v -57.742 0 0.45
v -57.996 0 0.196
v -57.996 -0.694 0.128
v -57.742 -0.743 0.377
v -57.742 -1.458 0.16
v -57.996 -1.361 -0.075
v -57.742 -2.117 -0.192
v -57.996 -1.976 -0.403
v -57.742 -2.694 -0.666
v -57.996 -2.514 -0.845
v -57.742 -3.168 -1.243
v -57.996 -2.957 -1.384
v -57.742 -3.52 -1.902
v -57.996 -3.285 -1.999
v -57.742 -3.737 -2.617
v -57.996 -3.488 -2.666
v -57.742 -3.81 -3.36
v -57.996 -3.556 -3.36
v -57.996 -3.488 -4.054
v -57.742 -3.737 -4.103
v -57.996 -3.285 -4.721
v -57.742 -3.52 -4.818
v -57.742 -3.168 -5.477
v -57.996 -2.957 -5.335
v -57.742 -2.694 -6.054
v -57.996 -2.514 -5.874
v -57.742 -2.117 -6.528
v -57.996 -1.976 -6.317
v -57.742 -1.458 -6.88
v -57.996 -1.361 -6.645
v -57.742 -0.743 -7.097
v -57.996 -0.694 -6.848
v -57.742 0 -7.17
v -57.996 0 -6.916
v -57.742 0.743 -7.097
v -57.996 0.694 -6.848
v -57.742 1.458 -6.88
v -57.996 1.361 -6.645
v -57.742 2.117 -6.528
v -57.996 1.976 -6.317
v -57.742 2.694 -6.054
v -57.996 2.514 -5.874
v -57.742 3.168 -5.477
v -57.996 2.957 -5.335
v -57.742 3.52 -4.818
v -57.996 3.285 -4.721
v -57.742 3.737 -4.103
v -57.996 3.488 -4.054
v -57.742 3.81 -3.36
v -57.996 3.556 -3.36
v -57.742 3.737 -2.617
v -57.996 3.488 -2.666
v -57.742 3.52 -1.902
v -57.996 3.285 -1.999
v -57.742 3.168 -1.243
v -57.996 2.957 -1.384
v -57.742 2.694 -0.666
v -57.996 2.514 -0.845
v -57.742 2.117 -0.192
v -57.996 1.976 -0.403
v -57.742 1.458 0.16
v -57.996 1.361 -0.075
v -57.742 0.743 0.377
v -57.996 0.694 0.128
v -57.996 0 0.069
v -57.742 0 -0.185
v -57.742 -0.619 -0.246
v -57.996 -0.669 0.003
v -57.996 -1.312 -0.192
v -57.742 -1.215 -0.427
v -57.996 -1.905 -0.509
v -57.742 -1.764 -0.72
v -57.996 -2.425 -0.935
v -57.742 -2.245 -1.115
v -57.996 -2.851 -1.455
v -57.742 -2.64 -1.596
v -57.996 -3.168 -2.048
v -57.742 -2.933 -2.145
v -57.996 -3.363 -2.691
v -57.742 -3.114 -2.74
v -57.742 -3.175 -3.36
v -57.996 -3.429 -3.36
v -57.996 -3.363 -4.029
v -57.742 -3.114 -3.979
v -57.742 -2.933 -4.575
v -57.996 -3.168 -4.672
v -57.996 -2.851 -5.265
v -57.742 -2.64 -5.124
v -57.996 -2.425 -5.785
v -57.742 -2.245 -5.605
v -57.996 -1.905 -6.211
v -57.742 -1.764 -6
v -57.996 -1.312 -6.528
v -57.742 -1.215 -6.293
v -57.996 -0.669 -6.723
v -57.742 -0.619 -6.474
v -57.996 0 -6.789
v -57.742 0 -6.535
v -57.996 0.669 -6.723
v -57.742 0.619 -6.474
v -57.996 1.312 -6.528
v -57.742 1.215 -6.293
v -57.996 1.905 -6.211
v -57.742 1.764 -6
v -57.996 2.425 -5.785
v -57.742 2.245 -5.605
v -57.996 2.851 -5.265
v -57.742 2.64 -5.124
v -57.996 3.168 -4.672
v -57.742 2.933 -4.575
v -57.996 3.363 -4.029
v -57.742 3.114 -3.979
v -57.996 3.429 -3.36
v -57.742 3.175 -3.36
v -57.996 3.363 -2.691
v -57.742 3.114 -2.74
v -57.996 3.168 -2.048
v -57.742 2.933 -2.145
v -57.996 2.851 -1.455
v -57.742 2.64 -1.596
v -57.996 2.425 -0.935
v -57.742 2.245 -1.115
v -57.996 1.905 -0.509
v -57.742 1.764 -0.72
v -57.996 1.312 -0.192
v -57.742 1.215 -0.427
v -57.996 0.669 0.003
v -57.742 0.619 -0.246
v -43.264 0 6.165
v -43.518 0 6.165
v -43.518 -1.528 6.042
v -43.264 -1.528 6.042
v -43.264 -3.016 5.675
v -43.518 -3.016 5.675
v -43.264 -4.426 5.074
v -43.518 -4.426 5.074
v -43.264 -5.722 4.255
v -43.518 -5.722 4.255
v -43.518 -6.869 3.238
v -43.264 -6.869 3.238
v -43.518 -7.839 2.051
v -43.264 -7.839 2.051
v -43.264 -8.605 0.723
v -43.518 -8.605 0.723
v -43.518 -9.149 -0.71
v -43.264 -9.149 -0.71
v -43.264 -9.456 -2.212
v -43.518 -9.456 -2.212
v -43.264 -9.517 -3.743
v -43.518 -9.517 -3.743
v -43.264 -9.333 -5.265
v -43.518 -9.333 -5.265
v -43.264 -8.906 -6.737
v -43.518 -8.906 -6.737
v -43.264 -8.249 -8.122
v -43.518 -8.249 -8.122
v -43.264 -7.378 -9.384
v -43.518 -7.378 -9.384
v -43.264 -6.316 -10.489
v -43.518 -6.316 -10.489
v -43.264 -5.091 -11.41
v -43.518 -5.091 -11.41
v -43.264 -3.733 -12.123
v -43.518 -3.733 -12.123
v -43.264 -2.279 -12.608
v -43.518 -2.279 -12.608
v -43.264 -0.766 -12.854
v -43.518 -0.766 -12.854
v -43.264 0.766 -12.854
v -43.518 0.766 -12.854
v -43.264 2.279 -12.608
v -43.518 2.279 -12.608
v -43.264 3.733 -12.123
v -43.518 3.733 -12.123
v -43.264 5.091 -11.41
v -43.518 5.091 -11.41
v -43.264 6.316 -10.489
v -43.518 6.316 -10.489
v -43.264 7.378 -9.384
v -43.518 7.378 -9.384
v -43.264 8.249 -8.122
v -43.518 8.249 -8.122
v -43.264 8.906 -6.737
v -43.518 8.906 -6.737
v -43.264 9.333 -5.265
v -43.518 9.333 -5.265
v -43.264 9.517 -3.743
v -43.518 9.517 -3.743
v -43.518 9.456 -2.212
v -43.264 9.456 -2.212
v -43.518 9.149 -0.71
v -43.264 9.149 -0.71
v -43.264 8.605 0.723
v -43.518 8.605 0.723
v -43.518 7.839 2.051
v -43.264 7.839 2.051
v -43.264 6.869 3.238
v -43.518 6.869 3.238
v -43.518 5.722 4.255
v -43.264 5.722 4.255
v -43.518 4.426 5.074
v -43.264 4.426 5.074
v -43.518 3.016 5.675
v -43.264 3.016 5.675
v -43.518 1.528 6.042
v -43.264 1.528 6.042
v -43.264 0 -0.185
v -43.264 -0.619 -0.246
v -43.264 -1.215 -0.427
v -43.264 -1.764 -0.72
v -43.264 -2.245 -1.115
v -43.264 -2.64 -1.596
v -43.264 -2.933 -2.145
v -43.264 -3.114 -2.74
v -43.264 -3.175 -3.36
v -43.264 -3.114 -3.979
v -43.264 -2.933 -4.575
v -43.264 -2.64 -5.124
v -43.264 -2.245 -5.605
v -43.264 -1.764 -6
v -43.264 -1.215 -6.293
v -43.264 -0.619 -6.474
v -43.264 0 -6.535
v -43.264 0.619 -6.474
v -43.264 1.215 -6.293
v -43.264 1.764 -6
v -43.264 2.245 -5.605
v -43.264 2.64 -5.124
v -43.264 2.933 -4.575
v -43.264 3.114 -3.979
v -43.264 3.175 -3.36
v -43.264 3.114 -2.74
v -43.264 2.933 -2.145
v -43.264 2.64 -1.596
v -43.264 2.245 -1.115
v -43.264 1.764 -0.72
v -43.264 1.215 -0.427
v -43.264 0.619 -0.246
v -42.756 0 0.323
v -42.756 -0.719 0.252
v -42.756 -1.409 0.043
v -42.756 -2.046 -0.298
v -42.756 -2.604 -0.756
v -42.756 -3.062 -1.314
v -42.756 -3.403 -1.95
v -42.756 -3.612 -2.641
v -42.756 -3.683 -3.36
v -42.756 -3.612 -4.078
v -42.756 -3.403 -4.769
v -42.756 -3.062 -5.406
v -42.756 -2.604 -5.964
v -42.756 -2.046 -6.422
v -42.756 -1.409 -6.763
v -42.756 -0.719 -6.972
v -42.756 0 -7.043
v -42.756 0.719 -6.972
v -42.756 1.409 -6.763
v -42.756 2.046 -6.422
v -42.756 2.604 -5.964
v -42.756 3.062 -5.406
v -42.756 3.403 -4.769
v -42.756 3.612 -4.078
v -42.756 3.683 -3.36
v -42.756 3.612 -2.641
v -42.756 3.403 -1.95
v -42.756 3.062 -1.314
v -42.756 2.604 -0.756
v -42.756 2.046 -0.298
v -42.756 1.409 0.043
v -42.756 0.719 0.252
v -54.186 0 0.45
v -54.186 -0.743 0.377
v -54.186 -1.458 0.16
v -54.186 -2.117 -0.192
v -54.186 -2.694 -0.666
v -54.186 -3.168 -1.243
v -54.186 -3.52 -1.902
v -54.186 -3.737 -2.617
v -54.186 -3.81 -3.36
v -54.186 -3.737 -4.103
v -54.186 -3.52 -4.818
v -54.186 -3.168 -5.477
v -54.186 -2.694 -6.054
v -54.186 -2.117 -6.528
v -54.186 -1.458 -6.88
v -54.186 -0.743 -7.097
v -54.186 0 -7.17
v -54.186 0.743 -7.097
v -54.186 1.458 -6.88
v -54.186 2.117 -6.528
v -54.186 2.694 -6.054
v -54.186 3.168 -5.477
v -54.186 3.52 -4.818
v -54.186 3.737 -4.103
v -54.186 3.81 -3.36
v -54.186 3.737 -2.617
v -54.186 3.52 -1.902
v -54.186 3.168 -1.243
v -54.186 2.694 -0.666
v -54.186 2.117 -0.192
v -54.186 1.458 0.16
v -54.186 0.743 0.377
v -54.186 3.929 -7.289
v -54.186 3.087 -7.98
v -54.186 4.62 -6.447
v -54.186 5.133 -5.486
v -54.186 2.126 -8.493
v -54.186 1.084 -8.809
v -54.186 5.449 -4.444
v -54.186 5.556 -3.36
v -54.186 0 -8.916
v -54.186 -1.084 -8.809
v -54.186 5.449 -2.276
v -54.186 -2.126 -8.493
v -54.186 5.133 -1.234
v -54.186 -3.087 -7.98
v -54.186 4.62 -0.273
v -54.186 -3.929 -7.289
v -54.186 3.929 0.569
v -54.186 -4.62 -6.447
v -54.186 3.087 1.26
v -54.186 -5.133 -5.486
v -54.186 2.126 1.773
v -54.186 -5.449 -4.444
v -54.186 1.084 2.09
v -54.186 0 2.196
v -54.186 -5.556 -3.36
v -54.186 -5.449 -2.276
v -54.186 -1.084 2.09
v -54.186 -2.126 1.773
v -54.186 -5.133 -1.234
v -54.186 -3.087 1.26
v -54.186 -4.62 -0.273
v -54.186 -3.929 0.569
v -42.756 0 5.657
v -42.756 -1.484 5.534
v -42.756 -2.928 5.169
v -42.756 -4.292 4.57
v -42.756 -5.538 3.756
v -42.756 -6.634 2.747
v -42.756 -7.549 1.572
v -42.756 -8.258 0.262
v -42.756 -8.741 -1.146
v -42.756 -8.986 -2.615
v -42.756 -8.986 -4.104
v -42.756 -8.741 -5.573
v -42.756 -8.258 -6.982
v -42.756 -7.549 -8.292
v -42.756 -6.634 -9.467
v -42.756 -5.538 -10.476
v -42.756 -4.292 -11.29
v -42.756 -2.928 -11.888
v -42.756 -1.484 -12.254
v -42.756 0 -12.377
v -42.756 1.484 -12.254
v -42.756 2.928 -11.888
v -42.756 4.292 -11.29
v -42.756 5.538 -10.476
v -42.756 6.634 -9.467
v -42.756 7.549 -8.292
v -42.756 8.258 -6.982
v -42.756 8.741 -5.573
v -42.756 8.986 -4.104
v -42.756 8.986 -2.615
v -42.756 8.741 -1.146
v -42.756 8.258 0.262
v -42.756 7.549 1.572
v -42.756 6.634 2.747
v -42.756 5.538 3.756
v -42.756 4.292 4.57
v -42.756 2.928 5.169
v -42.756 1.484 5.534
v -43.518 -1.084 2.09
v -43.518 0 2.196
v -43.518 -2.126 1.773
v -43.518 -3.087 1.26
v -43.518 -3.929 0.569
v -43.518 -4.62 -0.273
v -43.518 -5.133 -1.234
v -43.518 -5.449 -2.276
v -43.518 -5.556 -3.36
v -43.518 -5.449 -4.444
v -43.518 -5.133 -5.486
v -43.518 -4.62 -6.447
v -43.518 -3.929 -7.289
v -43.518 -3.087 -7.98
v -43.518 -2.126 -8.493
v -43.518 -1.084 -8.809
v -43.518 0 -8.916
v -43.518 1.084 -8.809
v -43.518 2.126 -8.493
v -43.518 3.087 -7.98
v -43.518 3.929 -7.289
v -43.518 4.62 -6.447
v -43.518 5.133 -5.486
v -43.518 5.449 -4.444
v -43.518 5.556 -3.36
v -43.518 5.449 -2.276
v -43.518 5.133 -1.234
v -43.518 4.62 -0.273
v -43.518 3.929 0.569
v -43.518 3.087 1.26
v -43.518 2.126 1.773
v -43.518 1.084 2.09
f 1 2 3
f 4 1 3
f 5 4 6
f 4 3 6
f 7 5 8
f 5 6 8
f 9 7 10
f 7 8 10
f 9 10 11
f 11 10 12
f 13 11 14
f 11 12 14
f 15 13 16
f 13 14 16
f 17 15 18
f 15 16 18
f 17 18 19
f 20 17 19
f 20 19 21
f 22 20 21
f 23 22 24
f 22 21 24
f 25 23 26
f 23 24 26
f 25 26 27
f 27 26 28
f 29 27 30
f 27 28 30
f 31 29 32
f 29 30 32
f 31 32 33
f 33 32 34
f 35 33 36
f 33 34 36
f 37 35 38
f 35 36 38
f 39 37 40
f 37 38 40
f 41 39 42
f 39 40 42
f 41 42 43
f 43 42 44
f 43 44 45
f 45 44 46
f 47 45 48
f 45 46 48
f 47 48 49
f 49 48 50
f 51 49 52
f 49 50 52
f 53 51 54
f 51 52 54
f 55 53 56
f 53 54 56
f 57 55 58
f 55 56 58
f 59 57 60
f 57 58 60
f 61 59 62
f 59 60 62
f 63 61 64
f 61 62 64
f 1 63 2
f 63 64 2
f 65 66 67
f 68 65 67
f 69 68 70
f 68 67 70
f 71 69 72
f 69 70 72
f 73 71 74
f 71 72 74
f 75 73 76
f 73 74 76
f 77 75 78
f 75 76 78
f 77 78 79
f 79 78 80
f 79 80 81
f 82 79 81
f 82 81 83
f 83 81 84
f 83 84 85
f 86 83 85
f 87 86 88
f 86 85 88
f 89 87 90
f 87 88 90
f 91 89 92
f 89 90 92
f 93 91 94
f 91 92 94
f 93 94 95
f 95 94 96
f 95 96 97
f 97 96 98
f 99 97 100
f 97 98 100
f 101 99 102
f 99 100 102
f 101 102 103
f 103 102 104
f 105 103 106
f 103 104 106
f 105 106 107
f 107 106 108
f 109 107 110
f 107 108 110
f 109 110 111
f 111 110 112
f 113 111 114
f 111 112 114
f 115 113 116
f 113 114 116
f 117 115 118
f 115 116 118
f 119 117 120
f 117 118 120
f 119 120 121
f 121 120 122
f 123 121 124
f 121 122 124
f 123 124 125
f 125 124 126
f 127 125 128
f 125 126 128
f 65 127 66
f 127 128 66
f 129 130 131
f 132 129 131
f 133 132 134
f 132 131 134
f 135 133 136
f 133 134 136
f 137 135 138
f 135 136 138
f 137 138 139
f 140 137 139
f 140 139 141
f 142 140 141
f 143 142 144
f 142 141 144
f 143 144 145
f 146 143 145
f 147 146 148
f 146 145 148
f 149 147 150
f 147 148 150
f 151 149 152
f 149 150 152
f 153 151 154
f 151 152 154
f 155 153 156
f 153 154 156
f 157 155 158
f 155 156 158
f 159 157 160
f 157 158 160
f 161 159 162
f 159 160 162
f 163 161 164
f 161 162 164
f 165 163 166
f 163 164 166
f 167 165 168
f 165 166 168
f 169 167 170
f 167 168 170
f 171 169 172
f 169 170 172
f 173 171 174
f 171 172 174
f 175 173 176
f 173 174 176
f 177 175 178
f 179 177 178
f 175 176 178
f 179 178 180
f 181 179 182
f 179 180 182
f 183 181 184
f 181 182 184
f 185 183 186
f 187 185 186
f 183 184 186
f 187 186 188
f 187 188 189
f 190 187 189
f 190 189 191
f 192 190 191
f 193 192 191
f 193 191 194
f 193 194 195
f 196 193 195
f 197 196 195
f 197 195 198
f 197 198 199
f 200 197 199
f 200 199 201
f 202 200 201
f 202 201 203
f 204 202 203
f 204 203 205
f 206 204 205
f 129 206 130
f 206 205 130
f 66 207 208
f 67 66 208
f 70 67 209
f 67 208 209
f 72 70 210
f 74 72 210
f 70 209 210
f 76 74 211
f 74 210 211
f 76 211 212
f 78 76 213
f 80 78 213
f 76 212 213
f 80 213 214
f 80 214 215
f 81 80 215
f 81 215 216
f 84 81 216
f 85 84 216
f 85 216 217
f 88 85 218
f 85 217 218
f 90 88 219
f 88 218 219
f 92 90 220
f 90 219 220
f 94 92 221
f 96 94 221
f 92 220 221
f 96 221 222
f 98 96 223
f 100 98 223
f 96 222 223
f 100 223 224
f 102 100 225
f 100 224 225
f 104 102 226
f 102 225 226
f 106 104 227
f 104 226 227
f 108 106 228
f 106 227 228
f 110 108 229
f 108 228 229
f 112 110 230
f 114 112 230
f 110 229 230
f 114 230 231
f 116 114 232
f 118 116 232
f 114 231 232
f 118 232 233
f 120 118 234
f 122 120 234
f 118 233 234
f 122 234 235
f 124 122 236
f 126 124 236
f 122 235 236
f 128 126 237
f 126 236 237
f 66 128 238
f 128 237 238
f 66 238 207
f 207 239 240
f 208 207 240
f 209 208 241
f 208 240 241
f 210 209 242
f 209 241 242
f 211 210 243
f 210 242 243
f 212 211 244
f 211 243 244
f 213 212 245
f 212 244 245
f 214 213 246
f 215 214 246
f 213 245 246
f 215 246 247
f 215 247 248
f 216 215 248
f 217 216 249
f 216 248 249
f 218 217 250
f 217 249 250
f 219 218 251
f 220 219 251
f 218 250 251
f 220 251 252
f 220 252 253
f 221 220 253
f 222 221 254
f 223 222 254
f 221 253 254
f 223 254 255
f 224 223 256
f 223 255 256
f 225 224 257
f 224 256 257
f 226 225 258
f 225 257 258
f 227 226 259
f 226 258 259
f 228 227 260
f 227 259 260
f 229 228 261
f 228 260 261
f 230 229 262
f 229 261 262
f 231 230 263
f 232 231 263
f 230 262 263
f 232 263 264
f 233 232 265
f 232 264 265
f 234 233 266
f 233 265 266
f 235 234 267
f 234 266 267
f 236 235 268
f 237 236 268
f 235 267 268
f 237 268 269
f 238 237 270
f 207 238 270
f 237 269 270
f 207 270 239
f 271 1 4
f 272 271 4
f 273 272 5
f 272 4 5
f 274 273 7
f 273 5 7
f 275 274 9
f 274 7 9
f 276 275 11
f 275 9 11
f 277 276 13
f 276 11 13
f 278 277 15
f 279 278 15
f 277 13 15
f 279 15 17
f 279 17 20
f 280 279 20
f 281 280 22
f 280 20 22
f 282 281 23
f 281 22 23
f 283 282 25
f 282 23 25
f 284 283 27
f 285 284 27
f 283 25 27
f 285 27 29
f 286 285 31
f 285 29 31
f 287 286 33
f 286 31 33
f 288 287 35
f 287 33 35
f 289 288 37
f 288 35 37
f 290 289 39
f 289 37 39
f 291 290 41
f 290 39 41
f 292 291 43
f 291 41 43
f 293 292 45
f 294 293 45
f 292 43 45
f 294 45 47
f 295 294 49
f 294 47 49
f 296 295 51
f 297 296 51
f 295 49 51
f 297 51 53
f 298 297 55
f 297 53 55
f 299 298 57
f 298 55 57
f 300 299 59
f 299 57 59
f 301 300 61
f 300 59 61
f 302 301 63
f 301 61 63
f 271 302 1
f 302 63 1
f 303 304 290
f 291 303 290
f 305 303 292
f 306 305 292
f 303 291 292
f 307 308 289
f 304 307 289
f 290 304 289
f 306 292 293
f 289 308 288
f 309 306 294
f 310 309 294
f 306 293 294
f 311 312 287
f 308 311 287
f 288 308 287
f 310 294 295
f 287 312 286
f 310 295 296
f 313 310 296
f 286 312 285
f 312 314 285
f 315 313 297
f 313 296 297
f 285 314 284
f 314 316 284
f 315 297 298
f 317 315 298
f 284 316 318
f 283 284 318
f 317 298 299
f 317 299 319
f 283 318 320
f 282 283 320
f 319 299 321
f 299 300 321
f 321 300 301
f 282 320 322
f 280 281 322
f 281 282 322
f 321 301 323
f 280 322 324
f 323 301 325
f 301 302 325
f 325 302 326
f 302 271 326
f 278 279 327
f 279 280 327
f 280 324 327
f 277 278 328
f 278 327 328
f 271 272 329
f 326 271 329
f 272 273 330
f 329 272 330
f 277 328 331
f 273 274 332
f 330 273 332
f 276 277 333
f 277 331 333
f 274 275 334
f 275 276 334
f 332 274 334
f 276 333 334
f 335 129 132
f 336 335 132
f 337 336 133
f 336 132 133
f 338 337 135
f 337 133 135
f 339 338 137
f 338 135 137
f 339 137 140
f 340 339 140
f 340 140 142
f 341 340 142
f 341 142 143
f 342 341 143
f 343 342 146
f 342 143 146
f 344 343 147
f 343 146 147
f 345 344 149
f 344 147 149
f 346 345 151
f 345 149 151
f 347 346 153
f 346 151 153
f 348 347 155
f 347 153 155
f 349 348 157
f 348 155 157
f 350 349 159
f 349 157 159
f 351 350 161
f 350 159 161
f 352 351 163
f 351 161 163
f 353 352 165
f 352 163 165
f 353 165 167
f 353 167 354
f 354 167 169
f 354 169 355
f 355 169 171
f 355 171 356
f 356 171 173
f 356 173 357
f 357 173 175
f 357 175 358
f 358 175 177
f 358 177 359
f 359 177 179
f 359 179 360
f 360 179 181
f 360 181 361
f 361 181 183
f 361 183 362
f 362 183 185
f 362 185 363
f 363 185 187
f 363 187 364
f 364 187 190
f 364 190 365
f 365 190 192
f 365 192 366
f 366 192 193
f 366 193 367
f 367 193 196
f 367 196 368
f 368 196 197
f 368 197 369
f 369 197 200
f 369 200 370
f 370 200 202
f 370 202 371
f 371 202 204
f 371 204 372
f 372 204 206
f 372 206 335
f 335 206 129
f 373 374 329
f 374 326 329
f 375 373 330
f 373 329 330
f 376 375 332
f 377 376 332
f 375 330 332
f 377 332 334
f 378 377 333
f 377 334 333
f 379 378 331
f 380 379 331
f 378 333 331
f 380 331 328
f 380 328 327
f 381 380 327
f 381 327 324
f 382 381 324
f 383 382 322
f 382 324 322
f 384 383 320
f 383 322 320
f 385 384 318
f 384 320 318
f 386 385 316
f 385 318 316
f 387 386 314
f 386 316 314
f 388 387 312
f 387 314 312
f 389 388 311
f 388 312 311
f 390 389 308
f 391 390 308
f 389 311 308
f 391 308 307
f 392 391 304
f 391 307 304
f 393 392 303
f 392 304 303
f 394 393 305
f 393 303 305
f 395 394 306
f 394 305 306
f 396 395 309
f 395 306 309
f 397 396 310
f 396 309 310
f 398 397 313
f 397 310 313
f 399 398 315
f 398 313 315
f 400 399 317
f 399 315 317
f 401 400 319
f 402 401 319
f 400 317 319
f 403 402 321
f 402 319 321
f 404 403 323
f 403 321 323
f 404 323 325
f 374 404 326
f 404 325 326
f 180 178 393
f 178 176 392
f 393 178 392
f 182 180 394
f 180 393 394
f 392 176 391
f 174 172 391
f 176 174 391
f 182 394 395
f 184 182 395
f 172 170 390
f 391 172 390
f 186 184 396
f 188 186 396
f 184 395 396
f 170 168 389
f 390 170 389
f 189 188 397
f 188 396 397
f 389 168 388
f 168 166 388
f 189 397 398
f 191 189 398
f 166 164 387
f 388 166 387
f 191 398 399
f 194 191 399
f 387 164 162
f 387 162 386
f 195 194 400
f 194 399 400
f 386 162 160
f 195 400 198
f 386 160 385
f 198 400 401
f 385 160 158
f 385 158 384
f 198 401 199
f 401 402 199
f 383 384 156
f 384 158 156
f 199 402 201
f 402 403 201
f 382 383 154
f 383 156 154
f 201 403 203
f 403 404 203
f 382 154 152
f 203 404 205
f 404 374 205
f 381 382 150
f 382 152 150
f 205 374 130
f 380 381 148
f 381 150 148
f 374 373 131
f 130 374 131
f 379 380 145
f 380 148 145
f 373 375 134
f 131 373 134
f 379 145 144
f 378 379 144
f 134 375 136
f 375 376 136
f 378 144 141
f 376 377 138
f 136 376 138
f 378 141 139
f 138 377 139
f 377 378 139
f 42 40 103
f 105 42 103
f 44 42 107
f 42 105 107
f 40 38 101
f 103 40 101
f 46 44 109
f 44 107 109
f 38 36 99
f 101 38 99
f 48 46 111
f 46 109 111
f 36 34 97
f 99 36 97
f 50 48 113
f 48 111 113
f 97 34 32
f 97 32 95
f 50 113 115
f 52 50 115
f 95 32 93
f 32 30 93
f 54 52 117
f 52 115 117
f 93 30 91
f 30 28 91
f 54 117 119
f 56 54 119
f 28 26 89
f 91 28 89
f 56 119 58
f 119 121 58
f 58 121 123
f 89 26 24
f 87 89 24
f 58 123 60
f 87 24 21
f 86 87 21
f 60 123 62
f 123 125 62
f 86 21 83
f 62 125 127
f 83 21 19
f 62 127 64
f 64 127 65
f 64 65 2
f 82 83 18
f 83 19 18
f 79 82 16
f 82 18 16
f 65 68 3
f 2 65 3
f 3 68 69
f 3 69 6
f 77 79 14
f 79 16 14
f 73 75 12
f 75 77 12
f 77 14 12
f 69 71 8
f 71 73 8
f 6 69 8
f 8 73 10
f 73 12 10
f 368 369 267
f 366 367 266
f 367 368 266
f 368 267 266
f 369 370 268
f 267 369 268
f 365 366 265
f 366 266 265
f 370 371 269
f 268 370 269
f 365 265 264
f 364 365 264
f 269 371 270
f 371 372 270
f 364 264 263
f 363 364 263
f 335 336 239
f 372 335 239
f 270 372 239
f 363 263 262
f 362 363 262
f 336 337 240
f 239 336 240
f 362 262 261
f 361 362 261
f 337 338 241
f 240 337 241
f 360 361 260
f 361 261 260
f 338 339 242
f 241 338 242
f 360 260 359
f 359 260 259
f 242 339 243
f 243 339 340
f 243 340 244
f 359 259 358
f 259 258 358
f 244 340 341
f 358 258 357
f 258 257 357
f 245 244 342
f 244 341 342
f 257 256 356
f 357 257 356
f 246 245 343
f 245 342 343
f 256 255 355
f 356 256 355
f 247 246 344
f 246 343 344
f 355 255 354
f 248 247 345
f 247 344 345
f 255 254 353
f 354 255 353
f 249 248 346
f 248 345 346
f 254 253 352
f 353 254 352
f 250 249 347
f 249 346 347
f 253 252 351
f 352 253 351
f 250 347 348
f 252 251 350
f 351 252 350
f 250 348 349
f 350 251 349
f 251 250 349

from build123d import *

# Parameters (mm, degrees)
CHAMFER1_SIZE = 0.254
CHAMFER2_SIZE = 0.508
CHAMFER3_SIZE = 0.508


with BuildPart() as part:
    # Sketch1 → Revolve1 (revolve)
    with BuildSketch(Plane(origin=(0, 0, 0), x_dir=(1, 0, 0), z_dir=(0, 1, 0)), mode=Mode.PRIVATE) as revolve1_sk:
        Polygon((-54.186066728, 7.169875811), (-57.996066728, 7.169875811), (-57.996066728, 6.534875811), (-42.756066728, 6.534875811), (-42.756066728, 12.884875811), (-43.518066728, 12.884875811), (-43.518066728, 8.916125811), (-54.186066728, 8.916125811), align=None)
    revolve(revolve1_sk.sketch.rotate(Axis((-57.996066728, 0, -3.359875811), (1, 0, 0)), 180), axis=Axis((-57.996066728, 0, -3.359875811), (1, 0, 0)))

    # Chamfer1
    chamfer1_edges = [part.edges().sort_by_distance(p)[0] for p in [
        (-57.996066728, 0, -7.169875811),
        (-57.996066728, 0, -6.534875811),
    ]]
    chamfer(chamfer1_edges, length=CHAMFER1_SIZE)

    # Chamfer2
    chamfer2_edges = [part.edges().sort_by_distance(p)[0] for p in [
        (-42.756066728, 0, -6.534875811),
    ]]
    chamfer(chamfer2_edges, length=CHAMFER2_SIZE)

    # Chamfer3
    chamfer3_edges = [part.edges().sort_by_distance(p)[0] for p in [
        (-42.756066728, 0, -12.884875811),
    ]]
    chamfer(chamfer3_edges, length=CHAMFER3_SIZE)


solid = part.part
